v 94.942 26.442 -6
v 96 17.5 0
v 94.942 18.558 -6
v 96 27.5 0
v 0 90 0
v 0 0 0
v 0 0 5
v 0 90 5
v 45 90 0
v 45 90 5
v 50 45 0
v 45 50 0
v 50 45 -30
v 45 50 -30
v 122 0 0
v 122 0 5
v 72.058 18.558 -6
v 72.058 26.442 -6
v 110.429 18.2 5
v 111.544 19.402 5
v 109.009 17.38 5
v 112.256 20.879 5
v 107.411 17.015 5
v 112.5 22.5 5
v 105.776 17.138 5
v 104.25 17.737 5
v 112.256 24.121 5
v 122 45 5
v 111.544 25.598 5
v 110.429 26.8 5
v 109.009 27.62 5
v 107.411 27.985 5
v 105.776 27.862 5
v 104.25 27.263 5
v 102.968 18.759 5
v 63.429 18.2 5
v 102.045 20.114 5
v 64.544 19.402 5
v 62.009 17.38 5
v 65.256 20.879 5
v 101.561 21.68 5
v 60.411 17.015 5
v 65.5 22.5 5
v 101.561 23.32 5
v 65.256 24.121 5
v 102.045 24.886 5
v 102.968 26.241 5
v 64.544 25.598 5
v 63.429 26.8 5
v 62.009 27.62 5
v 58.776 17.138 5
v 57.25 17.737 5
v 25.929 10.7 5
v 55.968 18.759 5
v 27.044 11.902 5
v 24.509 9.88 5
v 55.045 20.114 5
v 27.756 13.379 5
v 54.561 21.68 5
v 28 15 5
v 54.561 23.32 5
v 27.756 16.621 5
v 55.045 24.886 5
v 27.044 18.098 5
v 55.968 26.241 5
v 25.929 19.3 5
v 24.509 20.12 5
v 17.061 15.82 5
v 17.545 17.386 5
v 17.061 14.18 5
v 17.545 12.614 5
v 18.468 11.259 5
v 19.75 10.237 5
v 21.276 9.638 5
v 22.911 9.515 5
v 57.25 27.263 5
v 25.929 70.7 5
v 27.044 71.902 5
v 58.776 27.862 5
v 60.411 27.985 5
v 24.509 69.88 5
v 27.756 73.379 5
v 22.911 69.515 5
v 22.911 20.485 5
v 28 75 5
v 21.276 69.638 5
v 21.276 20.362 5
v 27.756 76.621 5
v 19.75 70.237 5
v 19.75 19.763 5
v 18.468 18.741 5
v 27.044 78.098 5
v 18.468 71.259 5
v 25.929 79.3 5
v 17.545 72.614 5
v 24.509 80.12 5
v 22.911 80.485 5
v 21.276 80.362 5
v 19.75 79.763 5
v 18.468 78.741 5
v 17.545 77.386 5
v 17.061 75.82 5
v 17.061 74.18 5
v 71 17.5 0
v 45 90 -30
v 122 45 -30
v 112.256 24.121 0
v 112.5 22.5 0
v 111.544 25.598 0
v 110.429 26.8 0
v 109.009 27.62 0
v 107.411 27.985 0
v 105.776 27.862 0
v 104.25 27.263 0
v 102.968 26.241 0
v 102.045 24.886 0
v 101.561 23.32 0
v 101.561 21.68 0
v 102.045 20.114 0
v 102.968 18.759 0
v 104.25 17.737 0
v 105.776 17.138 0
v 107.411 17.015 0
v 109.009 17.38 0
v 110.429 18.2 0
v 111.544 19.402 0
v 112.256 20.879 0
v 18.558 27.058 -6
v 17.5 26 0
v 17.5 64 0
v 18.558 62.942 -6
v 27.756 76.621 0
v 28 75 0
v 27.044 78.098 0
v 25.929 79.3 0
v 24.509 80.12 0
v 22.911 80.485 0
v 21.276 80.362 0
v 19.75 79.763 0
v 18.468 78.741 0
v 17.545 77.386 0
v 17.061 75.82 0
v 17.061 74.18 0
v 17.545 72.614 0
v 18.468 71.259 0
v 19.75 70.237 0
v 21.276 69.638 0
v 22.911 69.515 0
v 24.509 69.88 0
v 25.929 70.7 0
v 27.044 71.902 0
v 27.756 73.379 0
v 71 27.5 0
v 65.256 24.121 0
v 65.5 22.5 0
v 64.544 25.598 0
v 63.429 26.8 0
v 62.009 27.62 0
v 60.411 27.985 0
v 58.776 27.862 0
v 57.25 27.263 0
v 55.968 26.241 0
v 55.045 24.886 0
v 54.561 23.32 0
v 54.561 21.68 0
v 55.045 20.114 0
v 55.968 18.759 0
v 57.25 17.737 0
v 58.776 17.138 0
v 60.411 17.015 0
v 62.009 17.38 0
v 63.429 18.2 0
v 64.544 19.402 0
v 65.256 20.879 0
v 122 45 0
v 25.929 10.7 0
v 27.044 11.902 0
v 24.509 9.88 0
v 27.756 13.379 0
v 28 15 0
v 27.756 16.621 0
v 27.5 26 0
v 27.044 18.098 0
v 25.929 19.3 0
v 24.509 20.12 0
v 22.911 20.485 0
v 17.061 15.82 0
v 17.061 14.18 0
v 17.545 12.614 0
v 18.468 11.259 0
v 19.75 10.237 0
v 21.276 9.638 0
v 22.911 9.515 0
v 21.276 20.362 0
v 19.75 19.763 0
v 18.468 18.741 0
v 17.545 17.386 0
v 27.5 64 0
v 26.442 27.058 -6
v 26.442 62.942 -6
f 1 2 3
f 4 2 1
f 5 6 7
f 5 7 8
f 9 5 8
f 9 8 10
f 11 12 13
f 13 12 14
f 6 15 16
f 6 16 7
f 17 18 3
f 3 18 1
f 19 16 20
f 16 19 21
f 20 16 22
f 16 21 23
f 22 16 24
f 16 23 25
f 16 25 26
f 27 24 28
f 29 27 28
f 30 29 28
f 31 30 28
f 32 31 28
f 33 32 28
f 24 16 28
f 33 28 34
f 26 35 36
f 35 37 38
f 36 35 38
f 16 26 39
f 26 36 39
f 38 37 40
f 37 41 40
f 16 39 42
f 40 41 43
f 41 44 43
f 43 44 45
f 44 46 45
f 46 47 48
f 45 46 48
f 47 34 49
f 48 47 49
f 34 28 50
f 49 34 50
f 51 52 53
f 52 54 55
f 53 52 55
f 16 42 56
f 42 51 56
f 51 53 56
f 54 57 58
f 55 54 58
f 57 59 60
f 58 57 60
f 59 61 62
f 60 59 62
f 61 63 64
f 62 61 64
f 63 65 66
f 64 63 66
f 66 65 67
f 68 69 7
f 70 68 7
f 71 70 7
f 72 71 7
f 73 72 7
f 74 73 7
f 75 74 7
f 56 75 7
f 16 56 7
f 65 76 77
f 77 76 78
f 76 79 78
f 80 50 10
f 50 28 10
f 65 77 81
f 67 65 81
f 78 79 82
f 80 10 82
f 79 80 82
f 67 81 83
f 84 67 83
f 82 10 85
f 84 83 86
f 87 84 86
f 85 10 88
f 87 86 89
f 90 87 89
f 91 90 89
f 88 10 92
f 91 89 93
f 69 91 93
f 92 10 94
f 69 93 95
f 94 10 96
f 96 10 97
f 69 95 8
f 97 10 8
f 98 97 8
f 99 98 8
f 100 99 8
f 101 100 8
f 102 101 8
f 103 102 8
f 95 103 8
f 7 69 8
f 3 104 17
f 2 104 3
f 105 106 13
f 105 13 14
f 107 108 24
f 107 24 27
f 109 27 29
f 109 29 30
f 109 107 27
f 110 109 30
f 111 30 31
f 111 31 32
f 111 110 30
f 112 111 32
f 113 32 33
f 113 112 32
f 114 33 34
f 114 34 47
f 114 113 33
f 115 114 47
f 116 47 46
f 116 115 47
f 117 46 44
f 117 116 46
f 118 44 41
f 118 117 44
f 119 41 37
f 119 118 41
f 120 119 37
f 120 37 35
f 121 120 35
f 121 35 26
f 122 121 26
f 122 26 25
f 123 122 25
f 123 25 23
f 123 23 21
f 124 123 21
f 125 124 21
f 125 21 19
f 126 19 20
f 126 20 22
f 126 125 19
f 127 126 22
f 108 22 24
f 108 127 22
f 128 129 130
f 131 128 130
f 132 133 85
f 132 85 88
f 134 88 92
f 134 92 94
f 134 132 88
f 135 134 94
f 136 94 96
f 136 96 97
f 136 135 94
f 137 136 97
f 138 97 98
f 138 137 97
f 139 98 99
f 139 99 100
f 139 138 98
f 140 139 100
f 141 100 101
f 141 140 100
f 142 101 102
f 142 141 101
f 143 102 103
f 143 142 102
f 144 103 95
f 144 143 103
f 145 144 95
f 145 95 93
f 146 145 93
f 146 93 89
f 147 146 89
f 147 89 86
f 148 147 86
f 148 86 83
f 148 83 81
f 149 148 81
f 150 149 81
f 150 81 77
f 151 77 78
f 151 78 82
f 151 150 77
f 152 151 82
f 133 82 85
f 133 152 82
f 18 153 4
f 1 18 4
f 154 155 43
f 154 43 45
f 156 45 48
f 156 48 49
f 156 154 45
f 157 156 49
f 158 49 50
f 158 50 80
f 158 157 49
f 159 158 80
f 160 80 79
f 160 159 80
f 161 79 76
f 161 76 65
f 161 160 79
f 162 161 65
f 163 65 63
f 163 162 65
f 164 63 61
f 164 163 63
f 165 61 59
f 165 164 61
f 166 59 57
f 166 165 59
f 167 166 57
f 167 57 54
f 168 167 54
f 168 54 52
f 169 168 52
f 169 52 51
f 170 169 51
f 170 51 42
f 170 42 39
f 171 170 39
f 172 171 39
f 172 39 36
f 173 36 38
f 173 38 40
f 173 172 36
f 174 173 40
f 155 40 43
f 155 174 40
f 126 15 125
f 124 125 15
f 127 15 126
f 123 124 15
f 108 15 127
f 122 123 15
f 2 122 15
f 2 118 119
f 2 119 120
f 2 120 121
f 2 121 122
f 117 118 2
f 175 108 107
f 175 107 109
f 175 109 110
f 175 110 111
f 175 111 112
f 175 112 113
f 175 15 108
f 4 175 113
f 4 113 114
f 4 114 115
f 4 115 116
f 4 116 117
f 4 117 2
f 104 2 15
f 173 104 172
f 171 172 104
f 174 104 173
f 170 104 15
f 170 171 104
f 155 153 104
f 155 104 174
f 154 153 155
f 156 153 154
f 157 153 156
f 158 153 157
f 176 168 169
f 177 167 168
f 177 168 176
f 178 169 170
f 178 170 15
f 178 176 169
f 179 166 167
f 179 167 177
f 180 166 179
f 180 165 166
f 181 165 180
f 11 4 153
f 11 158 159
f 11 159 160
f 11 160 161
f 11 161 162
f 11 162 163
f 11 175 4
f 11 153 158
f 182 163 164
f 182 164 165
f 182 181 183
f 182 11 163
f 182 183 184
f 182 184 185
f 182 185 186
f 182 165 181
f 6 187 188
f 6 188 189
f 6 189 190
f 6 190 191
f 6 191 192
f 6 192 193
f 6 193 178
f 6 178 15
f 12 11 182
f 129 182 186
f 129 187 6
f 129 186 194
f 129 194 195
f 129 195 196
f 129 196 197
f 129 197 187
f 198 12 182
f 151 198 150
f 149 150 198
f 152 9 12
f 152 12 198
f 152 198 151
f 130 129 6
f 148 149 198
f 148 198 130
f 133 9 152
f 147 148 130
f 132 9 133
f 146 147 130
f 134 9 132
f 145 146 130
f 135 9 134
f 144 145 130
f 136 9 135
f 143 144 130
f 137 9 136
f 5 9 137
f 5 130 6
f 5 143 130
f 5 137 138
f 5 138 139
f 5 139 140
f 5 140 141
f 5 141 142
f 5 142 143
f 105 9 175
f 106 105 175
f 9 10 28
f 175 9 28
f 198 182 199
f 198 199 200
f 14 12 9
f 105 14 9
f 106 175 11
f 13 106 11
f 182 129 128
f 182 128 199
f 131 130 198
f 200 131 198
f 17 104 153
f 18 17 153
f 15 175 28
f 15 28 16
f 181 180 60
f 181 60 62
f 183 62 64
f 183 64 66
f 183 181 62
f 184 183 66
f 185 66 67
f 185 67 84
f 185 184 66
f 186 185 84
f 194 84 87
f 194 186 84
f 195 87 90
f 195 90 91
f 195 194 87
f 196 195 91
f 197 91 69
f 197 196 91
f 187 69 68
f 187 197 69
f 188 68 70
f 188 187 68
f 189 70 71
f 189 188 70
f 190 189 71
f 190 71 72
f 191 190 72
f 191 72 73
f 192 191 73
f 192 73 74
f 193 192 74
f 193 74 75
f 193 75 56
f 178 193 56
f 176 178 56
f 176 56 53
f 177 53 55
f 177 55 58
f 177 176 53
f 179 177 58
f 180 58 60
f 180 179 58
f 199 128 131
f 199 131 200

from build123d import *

# Parameters (mm, degrees)
ESQUISSE1_R        = 5.5
BOSS_EXTRU_1_DEPTH = 5
ESQUISSE2_W        = 10
ESQUISSE2_H        = 38
ESQUISSE2_W_2      = 25
ESQUISSE2_H_2      = 10
BOSS_EXTRU_2_DEPTH = 6
D_POUILLE3_ANGLE   = 10
BOSS_EXTRU_3_DEPTH = 30
CHANFREIN3_SIZE    = 5


with BuildPart() as part:
    # Esquisse1 → Boss.-Extru.1 (new body)
    with BuildSketch(Plane.XY):
        Polygon((0, 0), (0, 90), (45, 90), (122, 45), (122, 0), align=None)
        with Locations((22.5, 75)):
            Circle(ESQUISSE1_R, mode=Mode.SUBTRACT)
        with Locations((22.5, 15)):
            Circle(ESQUISSE1_R, mode=Mode.SUBTRACT)
        with Locations((107, 22.5)):
            Circle(ESQUISSE1_R, mode=Mode.SUBTRACT)
        with Locations((60, 22.5)):
            Circle(ESQUISSE1_R, mode=Mode.SUBTRACT)
    extrude(amount=BOSS_EXTRU_1_DEPTH)

    # Esquisse2 → Boss.-Extru.2 (add)
    with BuildSketch(Plane.XY):
        with Locations((22.5, 45)):
            Rectangle(ESQUISSE2_W, ESQUISSE2_H)
        with Locations((83.5, 22.5)):
            Rectangle(ESQUISSE2_W_2, ESQUISSE2_H_2)
    extrude(amount=-BOSS_EXTRU_2_DEPTH)

    # Dépouille3
    d_pouille3_faces = [part.faces().sort_by_distance(p)[0] for p in [
        (83.5, 27.5, -3),
        (96, 22.5, -3),
        (71, 22.5, -3),
        (83.5, 17.5, -3),
        (22.5, 26, -3),
        (27.5, 45, -3),
        (22.5, 64, -3),
        (17.5, 45, -3),
    ]]
    draft(d_pouille3_faces, Plane(origin=(0, 0, 0), x_dir=(-1, 0, 0), z_dir=(0, 0, -1)), D_POUILLE3_ANGLE)

    # Esquisse3 → Boss.-Extru.3 (add)
    with BuildSketch(Plane(origin=(0, 0, 0), x_dir=(-1, 0, 0), z_dir=(0, 0, -1))):
        Polygon((-122, 45), (-45, 45), (-45, 90), align=None)
    extrude(amount=BOSS_EXTRU_3_DEPTH)

    # Chanfrein3
    chanfrein3_edges = [part.edges().sort_by_distance(p)[0] for p in [
        (45, 45, -15),
    ]]
    chamfer(chanfrein3_edges, length=CHANFREIN3_SIZE)


solid = part.part
